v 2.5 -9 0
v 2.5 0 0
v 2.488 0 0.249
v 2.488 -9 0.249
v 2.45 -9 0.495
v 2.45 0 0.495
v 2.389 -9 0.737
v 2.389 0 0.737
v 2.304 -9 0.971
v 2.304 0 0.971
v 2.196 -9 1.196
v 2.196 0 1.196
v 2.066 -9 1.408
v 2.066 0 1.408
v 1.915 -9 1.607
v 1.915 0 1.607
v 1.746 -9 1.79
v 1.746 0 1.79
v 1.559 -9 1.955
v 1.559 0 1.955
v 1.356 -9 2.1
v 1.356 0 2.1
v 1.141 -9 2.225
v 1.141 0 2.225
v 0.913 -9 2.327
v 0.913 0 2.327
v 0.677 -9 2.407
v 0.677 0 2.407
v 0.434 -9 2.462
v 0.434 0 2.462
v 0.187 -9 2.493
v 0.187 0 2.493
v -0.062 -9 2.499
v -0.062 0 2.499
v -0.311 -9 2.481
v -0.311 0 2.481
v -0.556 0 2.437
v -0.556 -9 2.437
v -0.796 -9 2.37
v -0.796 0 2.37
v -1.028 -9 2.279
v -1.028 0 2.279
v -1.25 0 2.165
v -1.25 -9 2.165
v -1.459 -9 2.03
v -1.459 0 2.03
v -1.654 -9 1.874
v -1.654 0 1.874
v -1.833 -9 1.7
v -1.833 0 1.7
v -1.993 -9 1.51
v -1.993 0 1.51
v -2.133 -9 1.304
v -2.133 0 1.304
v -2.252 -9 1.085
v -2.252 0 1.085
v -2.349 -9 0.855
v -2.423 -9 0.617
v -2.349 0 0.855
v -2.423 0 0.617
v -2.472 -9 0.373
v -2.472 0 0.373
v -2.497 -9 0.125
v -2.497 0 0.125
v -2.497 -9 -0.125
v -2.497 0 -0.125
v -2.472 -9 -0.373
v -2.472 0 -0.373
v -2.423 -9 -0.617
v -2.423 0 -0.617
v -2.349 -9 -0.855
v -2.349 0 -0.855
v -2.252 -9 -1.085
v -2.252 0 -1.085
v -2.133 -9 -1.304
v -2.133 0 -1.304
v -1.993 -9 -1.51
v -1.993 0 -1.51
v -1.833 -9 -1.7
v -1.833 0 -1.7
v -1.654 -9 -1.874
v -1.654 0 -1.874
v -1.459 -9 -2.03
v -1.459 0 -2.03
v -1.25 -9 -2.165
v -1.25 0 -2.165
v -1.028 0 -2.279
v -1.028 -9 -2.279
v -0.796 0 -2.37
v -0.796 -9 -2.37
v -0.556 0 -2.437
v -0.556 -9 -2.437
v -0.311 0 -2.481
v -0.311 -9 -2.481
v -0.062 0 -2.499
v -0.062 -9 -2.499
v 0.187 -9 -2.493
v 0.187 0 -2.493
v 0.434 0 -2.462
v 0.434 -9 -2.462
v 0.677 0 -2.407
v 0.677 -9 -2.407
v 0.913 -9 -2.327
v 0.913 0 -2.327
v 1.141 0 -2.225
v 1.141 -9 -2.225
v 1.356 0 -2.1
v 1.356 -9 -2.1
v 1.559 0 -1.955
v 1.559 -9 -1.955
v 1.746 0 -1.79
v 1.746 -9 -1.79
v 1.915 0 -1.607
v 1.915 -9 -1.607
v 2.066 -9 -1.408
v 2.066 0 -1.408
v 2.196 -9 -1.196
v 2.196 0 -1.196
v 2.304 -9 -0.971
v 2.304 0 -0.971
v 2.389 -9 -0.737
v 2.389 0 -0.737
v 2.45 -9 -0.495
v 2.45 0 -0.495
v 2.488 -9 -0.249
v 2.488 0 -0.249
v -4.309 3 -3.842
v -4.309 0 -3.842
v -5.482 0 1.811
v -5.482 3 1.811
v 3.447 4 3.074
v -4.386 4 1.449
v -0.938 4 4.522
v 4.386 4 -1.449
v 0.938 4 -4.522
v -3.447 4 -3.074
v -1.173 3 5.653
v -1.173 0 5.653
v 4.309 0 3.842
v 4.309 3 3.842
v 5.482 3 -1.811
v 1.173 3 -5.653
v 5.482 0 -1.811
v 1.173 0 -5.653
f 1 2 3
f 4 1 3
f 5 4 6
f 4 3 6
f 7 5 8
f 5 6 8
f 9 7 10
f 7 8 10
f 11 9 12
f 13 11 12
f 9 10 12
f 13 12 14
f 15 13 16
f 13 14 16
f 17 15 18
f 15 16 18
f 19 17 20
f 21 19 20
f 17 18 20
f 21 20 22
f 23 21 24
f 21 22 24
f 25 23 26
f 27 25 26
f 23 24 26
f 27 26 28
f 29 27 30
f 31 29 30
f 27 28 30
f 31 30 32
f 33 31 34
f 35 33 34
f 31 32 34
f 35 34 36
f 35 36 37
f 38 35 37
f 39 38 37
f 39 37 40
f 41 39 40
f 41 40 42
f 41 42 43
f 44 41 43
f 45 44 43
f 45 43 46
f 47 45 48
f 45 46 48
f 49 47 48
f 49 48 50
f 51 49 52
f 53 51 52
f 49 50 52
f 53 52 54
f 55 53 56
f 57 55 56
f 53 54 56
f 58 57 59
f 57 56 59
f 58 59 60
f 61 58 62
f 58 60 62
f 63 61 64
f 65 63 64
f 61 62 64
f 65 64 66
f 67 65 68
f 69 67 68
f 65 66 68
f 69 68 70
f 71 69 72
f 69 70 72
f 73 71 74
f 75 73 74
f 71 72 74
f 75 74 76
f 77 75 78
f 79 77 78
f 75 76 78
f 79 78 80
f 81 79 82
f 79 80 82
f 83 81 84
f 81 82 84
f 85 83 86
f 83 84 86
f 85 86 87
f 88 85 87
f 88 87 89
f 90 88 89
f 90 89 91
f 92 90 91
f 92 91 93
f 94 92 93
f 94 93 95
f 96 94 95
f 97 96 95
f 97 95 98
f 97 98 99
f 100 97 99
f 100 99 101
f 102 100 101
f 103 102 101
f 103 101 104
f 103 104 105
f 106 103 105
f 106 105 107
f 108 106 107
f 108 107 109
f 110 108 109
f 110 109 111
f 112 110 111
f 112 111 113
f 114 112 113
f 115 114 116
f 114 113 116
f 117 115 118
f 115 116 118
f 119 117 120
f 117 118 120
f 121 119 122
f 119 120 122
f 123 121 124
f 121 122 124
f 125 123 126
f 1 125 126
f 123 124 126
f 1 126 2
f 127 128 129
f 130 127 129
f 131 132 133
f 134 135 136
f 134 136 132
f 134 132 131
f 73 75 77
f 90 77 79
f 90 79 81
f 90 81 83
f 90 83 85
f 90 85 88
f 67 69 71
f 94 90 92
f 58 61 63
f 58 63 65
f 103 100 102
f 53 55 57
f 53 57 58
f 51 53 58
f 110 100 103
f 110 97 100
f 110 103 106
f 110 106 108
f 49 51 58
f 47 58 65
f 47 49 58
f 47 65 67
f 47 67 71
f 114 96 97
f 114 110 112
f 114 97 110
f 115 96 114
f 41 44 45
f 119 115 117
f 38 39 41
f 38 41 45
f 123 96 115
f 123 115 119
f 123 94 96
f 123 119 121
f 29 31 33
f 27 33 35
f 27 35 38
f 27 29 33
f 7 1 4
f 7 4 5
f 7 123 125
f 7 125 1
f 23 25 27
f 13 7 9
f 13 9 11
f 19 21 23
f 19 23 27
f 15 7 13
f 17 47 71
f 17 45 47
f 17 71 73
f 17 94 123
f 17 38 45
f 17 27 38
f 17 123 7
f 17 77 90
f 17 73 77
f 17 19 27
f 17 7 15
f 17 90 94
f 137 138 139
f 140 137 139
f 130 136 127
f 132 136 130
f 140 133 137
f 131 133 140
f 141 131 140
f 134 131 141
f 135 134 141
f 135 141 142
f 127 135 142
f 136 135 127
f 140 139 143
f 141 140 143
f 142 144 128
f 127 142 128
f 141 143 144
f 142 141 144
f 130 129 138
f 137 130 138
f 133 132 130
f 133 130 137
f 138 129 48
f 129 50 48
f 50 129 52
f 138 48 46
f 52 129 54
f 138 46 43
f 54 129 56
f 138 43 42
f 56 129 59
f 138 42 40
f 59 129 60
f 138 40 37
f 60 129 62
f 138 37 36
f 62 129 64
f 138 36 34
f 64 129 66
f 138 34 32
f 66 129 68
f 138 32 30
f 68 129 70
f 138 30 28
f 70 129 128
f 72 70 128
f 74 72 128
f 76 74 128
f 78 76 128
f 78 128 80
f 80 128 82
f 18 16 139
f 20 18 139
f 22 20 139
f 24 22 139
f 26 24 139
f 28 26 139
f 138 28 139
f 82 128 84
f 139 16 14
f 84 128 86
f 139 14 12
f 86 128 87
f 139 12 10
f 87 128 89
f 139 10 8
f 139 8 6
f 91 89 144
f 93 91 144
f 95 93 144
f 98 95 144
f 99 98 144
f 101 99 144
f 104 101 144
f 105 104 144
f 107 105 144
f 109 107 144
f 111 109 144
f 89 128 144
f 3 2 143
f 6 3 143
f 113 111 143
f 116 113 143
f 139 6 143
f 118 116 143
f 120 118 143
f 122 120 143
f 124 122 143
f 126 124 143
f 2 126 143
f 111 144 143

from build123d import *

# Parameters (mm, degrees)
BOSS_EXTRUDE1_DEPTH = 4
CHAMFER2_SIZE       = 1
SKETCH4_R           = 2.5
BOSS_EXTRUDE3_DEPTH = 9


with BuildPart() as part:
    # Sketch2 → Boss-Extrude1 (new body)
    with BuildSketch(Plane(origin=(0, 0, 0), x_dir=(1, 0, 0), z_dir=(0, 1, 0))):
        Polygon((5.482188976, 1.810783632), (1.172909862, 5.653106738), (-4.309279114, 3.842323106), (-5.482188976, -1.810783632), (-1.172909862, -5.653106738), (4.309279114, -3.842323106), align=None)
    extrude(amount=BOSS_EXTRUDE1_DEPTH)

    # Chamfer2
    chamfer2_edges = [part.edges().sort_by_distance(p)[0] for p in [
        (-1.568184626, 4, -4.747714922),
        (-4.895734045, 4, -1.015769737),
        (-3.327549419, 4, 3.731945185),
        (1.568184626, 4, 4.747714922),
        (4.895734045, 4, 1.015769737),
        (3.327549419, 4, -3.731945185),
    ]]
    chamfer(chamfer2_edges, length=CHAMFER2_SIZE)

    # Sketch4 → Boss-Extrude3 (add)
    with BuildSketch(Plane.XZ):
        Circle(SKETCH4_R)
    extrude(amount=BOSS_EXTRUDE3_DEPTH)


solid = part.part
